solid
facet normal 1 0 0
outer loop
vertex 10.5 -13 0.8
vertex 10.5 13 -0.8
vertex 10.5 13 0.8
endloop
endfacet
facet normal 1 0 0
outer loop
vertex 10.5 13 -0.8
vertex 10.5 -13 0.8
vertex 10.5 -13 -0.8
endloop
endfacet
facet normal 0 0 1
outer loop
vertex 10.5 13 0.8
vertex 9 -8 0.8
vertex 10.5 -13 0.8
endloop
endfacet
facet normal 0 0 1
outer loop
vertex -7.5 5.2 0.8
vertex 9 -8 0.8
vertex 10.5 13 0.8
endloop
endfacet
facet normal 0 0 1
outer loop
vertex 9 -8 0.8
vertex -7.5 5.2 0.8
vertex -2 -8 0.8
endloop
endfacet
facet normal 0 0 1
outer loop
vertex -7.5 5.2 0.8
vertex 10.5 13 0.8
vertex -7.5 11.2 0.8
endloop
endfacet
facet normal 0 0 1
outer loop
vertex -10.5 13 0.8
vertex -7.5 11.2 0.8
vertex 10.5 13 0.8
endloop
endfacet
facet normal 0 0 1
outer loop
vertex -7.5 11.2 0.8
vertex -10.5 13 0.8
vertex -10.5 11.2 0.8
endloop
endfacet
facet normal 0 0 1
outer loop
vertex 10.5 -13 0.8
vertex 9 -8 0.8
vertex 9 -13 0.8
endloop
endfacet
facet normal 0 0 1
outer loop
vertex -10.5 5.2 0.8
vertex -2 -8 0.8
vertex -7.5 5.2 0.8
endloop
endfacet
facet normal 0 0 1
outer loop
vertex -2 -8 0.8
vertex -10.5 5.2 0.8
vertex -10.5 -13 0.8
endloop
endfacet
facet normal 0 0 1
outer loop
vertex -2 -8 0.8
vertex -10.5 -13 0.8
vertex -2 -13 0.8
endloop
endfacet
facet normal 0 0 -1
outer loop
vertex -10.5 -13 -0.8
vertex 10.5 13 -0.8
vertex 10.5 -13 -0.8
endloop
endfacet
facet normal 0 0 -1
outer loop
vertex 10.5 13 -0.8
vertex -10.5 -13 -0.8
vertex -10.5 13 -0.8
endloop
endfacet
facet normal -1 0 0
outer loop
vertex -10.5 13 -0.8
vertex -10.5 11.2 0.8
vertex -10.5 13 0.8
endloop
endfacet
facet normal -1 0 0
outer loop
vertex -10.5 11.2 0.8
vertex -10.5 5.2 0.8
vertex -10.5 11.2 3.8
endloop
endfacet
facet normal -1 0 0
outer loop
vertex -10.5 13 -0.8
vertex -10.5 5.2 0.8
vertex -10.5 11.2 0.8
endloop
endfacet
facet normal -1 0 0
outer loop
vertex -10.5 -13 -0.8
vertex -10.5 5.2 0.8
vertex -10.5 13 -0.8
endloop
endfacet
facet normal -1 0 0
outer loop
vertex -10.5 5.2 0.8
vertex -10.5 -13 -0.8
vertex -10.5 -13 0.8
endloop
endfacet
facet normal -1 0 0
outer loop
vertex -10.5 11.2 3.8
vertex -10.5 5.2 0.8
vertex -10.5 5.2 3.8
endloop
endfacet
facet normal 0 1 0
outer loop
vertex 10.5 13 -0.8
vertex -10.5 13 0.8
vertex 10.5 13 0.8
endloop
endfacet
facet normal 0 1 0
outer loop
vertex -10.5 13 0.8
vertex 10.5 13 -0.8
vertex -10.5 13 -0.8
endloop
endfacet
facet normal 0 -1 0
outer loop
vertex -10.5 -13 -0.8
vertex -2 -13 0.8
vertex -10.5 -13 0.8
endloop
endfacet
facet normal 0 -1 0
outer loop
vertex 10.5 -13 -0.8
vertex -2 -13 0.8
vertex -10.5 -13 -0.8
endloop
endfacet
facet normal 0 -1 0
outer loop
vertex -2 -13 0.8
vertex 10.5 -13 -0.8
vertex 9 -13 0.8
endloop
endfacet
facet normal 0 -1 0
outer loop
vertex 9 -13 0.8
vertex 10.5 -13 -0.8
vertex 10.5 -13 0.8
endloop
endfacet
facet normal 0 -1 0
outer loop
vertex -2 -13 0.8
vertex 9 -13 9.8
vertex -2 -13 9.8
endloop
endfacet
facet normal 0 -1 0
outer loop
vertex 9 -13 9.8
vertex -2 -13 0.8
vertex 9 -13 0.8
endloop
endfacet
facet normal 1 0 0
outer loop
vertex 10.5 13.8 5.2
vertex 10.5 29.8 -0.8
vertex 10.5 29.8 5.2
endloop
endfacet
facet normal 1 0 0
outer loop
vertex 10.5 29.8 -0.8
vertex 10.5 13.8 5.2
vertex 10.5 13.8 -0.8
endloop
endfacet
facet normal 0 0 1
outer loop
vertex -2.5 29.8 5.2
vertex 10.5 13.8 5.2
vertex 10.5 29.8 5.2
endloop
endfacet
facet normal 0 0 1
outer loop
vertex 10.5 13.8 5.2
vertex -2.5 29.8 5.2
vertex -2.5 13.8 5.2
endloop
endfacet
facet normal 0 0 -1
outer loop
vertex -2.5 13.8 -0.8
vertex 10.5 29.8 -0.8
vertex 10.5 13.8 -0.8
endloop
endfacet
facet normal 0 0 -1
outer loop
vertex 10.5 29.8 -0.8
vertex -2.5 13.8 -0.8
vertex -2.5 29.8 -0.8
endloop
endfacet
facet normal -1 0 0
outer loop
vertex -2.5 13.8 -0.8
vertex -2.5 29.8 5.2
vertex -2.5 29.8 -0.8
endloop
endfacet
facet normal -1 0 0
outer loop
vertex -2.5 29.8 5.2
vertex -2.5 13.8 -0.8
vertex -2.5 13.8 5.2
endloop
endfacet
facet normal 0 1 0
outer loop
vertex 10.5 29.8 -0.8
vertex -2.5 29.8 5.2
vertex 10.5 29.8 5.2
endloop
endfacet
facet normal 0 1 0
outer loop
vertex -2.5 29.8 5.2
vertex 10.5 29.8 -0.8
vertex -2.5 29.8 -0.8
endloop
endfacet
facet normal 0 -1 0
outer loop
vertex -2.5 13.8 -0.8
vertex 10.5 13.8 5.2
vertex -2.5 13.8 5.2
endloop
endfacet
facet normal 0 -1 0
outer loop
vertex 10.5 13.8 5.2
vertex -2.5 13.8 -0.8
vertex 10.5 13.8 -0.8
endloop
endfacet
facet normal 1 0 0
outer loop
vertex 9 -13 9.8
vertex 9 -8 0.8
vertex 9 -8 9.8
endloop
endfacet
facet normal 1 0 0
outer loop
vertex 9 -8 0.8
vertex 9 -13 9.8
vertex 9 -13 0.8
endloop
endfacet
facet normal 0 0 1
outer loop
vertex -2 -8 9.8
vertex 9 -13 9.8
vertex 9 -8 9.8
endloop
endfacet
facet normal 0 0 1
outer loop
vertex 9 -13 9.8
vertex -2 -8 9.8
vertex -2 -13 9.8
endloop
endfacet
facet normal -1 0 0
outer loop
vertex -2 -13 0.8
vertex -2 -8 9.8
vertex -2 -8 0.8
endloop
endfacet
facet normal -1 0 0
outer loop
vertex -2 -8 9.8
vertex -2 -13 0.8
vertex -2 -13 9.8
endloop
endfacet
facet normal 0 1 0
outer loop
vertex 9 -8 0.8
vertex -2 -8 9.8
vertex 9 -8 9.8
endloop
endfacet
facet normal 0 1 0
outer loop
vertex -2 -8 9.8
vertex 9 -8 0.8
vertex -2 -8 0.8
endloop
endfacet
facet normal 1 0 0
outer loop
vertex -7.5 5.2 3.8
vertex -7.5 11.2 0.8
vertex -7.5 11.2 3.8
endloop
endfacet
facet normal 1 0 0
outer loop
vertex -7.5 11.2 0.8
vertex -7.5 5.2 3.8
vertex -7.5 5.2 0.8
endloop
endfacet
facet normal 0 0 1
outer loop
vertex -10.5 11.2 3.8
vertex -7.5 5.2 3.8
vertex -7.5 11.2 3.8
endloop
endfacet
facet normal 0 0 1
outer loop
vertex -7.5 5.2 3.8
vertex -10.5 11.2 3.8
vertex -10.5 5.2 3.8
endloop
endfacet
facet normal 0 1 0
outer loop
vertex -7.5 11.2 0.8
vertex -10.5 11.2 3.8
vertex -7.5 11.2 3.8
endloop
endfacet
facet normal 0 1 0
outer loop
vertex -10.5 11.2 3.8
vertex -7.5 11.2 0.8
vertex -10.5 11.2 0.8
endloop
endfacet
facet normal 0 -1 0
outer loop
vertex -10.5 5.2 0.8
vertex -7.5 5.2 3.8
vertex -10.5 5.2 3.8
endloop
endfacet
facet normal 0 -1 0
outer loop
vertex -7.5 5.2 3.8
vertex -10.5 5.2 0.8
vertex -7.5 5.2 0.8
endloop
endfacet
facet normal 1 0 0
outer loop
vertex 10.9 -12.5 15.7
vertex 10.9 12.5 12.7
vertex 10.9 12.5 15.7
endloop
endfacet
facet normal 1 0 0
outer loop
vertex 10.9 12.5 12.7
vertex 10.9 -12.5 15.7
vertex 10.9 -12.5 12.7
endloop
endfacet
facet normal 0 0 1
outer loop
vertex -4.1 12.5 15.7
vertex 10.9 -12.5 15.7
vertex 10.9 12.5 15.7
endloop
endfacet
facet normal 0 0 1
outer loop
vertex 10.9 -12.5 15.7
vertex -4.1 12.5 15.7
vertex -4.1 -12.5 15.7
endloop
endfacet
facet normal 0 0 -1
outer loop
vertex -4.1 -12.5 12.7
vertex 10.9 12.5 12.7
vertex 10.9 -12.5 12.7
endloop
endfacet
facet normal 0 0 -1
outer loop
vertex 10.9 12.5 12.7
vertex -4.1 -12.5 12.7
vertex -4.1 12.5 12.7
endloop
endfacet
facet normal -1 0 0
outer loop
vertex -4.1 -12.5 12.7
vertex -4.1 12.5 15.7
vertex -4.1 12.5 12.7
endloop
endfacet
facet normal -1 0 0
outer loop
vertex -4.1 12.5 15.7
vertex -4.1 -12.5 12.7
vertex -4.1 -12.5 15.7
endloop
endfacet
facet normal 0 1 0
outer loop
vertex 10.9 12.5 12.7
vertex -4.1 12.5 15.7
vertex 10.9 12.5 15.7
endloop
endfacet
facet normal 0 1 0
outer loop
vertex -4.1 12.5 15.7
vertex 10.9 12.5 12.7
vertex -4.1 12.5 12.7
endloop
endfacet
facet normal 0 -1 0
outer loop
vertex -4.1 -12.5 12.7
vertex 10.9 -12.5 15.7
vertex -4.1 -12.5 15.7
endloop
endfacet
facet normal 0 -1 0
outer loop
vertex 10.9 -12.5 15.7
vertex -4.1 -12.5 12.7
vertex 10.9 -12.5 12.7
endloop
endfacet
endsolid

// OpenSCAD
// file: dimensions.scad
// Dimensions (in mm)

// Minimal Clearance
_min_cl = 0.2;

// Enclosure

enc_w = 38;
enc_d = 65;
enc_h = 20.5;

enc_tk = 2;

// Enclosure Lid

lid_h = enc_tk;

// Lid Screw Holes

lid_hole_r = 3.2/2;  // M3 screws
lid_hole_h = lid_h * 1.2;

lid_pocket_r = 6.4 / 2;  // Screw Head Pocket
lid_pocket_h = 1.1;

// Screw Inserts

screw_ins_r = 4.2/2;
screw_ins_h = 6;

screw_ins_h_of = enc_h / 2 - screw_ins_h + _min_cl * 1.1;

// Screw Supports

screw_sup_w = screw_ins_r * 2 + 2.2;
screw_sup_d = screw_ins_r * 2 + 2.2;
screw_sup_h = enc_h - enc_tk;

screw_sup_w_of = enc_w/2 - screw_sup_w/2 - enc_tk + 1;
screw_sup_d_of = enc_d/2 - screw_sup_d/2 - enc_tk + 1;
screw_sup_h_of = enc_tk/2;

// Enclosure Mesh

enc_mesh_tk = 1;

// ESP Board

esp_board_w = 15;     // 14.78
esp_board_d = 25;     // 24.60
esp_board_h = 3;      // 3.14
esp_board_w_of = 0.4; // Not measured

esp_conn_h = 2.9; // 2.90

// DHT Board

dht_board_w = 21;  // 20.90
dht_board_d = 26;  // 25.29
dht_board_h = 1.6; // 1.61

dht_enc_d_of = -(enc_d / 2 - dht_board_d / 2) + enc_tk + 2;  // Distance from the enclosure
dht_enc_h_of = enc_tk + 1.5;

dht_conn_w = 11;     // 10.52
dht_conn_d = 5;      // 4.93
dht_conn_h = 9;      // 8.88
dht_conn_w_of = 1.5; // 11.54

dht_w = 13;     // 12.54
dht_d = 16;     // 16.20
dht_h = 6;      // 6.01
dht_d_of = 0.8; // Offset from DHT module and board

// TODO: Validate dimensions
dht_slot_w = dht_w;
dht_slot_d = dht_d;
dht_slot_h = enc_tk + _min_cl * 2;

dht_slot_w_of = 4;  // Make dependent
dht_slot_d_of = 6.3;  // Make dependent
dht_slot_h_of = -enc_h / 2 + enc_tk / 2;

dht_btn_w = 3;      // 3.33
dht_btn_d = 6;      // 6.06
dht_btn_h = 3;      // 2.99
dht_btn_d_of = 1.8; // 1.84

// USB Board

usb_board_w = 15;  // 14.48
usb_board_d = 15;  // 14.85
usb_board_h = 1.1; // 1.10

// Distance from the enclosure
usb_enc_d_of = enc_d / 2 - usb_board_d / 2 - enc_tk - 1;
usb_enc_h_of = enc_tk + 12;

usb_conn_w = 7.3;  // 7.30
usb_conn_d = 5.3;  // 5.26
usb_conn_h = 2.3;  // 2.32
usb_conn_d_of = 1; // 1.02

usb_hole_d = 3.5;    // 3.48
usb_hole_w_of = 8.5; // 8.45 - Between the holes. Assuming they're centered.
usb_hole_d_of = 5.5; // 5.50 - From oposite side of USB connector

usb_sup_base_d = 3.7;
usb_sup_base_h = usb_enc_h_of - enc_tk - usb_board_h / 2;

usb_sup_hole_d = 1.4 * 1.1;  // For M1.6 screws, 110% tolerance
usb_sup_hole_h = usb_sup_base_h / 2;

usb_sup_base_w_of = usb_hole_w_of / 2 ;
usb_sup_base_d_of = usb_enc_d_of - enc_tk; // From lid center
usb_sup_base_h_of = -enc_h / 2 + enc_tk;

usb_slot_w = usb_conn_w + 4;
usb_slot_d = enc_tk + _min_cl *2;
usb_slot_h = usb_conn_h + 4;

usb_slot_w_of = 0;
usb_slot_d_of = enc_d / 2 - usb_slot_d / 2 + _min_cl;
usb_slot_h_of = -enc_h / 2 + enc_tk + usb_sup_base_h - usb_conn_h / 2;

usb_sup_rein_tk = .8;

usb_sup_rein_w = usb_hole_w_of * 2;
usb_sup_rein_d = usb_hole_w_of;
usb_sup_rein_h = usb_sup_base_h / 2;

usb_sup_rein_w_of = usb_hole_w_of / 2;
usb_sup_rein_d_of = usb_sup_base_d_of;
usb_sup_rein_h_of = usb_sup_base_h_of + usb_sup_rein_h / 2;

usb_sup_hole_h_of = usb_sup_rein_h + _min_cl;
// main file
// DHT Shield Board + ESP Board

include <dimensions.scad>

module dht_board() {
  // Board
  color("blue")
    cube([dht_board_w, dht_board_d, dht_board_h], center=true);

  // DHT Module
  color("deepskyblue")
    translate([dht_board_w/2-dht_w/2, dht_board_d/2+dht_d/2 + dht_d_of, dht_h/2 - dht_board_h/2])
    cube([dht_w, dht_d, dht_h], center=true);

  // ESP Connectors
  color("yellow")
    translate([
      dht_board_w/2-dht_conn_w/2 - dht_conn_w_of,
      -(dht_board_d/2-dht_conn_d/2),
      dht_conn_h/2 + dht_board_h/2
    ])
    cube([dht_conn_w, dht_conn_d, dht_conn_h], center=true);

  // Reset Button
  color("#222222") // Almost Black
    translate([
      -(dht_board_w/2 - dht_btn_w/2),
      dht_board_d/2 - dht_btn_d/2 - dht_btn_d_of,
      dht_board_h/2 + dht_btn_h/2
    ])
    cube([dht_btn_w, dht_btn_d, dht_btn_h], center=true);

  // ESP Board
  color("#222222") // Almost Black
    translate([
      dht_board_w/2 - esp_board_w/2 + esp_board_w_of,
      0,
      dht_board_h/2 + esp_board_h/2 + esp_conn_h + dht_conn_h
    ])
    cube([esp_board_w, esp_board_d, esp_board_h], center=true);
}

dht_board();
